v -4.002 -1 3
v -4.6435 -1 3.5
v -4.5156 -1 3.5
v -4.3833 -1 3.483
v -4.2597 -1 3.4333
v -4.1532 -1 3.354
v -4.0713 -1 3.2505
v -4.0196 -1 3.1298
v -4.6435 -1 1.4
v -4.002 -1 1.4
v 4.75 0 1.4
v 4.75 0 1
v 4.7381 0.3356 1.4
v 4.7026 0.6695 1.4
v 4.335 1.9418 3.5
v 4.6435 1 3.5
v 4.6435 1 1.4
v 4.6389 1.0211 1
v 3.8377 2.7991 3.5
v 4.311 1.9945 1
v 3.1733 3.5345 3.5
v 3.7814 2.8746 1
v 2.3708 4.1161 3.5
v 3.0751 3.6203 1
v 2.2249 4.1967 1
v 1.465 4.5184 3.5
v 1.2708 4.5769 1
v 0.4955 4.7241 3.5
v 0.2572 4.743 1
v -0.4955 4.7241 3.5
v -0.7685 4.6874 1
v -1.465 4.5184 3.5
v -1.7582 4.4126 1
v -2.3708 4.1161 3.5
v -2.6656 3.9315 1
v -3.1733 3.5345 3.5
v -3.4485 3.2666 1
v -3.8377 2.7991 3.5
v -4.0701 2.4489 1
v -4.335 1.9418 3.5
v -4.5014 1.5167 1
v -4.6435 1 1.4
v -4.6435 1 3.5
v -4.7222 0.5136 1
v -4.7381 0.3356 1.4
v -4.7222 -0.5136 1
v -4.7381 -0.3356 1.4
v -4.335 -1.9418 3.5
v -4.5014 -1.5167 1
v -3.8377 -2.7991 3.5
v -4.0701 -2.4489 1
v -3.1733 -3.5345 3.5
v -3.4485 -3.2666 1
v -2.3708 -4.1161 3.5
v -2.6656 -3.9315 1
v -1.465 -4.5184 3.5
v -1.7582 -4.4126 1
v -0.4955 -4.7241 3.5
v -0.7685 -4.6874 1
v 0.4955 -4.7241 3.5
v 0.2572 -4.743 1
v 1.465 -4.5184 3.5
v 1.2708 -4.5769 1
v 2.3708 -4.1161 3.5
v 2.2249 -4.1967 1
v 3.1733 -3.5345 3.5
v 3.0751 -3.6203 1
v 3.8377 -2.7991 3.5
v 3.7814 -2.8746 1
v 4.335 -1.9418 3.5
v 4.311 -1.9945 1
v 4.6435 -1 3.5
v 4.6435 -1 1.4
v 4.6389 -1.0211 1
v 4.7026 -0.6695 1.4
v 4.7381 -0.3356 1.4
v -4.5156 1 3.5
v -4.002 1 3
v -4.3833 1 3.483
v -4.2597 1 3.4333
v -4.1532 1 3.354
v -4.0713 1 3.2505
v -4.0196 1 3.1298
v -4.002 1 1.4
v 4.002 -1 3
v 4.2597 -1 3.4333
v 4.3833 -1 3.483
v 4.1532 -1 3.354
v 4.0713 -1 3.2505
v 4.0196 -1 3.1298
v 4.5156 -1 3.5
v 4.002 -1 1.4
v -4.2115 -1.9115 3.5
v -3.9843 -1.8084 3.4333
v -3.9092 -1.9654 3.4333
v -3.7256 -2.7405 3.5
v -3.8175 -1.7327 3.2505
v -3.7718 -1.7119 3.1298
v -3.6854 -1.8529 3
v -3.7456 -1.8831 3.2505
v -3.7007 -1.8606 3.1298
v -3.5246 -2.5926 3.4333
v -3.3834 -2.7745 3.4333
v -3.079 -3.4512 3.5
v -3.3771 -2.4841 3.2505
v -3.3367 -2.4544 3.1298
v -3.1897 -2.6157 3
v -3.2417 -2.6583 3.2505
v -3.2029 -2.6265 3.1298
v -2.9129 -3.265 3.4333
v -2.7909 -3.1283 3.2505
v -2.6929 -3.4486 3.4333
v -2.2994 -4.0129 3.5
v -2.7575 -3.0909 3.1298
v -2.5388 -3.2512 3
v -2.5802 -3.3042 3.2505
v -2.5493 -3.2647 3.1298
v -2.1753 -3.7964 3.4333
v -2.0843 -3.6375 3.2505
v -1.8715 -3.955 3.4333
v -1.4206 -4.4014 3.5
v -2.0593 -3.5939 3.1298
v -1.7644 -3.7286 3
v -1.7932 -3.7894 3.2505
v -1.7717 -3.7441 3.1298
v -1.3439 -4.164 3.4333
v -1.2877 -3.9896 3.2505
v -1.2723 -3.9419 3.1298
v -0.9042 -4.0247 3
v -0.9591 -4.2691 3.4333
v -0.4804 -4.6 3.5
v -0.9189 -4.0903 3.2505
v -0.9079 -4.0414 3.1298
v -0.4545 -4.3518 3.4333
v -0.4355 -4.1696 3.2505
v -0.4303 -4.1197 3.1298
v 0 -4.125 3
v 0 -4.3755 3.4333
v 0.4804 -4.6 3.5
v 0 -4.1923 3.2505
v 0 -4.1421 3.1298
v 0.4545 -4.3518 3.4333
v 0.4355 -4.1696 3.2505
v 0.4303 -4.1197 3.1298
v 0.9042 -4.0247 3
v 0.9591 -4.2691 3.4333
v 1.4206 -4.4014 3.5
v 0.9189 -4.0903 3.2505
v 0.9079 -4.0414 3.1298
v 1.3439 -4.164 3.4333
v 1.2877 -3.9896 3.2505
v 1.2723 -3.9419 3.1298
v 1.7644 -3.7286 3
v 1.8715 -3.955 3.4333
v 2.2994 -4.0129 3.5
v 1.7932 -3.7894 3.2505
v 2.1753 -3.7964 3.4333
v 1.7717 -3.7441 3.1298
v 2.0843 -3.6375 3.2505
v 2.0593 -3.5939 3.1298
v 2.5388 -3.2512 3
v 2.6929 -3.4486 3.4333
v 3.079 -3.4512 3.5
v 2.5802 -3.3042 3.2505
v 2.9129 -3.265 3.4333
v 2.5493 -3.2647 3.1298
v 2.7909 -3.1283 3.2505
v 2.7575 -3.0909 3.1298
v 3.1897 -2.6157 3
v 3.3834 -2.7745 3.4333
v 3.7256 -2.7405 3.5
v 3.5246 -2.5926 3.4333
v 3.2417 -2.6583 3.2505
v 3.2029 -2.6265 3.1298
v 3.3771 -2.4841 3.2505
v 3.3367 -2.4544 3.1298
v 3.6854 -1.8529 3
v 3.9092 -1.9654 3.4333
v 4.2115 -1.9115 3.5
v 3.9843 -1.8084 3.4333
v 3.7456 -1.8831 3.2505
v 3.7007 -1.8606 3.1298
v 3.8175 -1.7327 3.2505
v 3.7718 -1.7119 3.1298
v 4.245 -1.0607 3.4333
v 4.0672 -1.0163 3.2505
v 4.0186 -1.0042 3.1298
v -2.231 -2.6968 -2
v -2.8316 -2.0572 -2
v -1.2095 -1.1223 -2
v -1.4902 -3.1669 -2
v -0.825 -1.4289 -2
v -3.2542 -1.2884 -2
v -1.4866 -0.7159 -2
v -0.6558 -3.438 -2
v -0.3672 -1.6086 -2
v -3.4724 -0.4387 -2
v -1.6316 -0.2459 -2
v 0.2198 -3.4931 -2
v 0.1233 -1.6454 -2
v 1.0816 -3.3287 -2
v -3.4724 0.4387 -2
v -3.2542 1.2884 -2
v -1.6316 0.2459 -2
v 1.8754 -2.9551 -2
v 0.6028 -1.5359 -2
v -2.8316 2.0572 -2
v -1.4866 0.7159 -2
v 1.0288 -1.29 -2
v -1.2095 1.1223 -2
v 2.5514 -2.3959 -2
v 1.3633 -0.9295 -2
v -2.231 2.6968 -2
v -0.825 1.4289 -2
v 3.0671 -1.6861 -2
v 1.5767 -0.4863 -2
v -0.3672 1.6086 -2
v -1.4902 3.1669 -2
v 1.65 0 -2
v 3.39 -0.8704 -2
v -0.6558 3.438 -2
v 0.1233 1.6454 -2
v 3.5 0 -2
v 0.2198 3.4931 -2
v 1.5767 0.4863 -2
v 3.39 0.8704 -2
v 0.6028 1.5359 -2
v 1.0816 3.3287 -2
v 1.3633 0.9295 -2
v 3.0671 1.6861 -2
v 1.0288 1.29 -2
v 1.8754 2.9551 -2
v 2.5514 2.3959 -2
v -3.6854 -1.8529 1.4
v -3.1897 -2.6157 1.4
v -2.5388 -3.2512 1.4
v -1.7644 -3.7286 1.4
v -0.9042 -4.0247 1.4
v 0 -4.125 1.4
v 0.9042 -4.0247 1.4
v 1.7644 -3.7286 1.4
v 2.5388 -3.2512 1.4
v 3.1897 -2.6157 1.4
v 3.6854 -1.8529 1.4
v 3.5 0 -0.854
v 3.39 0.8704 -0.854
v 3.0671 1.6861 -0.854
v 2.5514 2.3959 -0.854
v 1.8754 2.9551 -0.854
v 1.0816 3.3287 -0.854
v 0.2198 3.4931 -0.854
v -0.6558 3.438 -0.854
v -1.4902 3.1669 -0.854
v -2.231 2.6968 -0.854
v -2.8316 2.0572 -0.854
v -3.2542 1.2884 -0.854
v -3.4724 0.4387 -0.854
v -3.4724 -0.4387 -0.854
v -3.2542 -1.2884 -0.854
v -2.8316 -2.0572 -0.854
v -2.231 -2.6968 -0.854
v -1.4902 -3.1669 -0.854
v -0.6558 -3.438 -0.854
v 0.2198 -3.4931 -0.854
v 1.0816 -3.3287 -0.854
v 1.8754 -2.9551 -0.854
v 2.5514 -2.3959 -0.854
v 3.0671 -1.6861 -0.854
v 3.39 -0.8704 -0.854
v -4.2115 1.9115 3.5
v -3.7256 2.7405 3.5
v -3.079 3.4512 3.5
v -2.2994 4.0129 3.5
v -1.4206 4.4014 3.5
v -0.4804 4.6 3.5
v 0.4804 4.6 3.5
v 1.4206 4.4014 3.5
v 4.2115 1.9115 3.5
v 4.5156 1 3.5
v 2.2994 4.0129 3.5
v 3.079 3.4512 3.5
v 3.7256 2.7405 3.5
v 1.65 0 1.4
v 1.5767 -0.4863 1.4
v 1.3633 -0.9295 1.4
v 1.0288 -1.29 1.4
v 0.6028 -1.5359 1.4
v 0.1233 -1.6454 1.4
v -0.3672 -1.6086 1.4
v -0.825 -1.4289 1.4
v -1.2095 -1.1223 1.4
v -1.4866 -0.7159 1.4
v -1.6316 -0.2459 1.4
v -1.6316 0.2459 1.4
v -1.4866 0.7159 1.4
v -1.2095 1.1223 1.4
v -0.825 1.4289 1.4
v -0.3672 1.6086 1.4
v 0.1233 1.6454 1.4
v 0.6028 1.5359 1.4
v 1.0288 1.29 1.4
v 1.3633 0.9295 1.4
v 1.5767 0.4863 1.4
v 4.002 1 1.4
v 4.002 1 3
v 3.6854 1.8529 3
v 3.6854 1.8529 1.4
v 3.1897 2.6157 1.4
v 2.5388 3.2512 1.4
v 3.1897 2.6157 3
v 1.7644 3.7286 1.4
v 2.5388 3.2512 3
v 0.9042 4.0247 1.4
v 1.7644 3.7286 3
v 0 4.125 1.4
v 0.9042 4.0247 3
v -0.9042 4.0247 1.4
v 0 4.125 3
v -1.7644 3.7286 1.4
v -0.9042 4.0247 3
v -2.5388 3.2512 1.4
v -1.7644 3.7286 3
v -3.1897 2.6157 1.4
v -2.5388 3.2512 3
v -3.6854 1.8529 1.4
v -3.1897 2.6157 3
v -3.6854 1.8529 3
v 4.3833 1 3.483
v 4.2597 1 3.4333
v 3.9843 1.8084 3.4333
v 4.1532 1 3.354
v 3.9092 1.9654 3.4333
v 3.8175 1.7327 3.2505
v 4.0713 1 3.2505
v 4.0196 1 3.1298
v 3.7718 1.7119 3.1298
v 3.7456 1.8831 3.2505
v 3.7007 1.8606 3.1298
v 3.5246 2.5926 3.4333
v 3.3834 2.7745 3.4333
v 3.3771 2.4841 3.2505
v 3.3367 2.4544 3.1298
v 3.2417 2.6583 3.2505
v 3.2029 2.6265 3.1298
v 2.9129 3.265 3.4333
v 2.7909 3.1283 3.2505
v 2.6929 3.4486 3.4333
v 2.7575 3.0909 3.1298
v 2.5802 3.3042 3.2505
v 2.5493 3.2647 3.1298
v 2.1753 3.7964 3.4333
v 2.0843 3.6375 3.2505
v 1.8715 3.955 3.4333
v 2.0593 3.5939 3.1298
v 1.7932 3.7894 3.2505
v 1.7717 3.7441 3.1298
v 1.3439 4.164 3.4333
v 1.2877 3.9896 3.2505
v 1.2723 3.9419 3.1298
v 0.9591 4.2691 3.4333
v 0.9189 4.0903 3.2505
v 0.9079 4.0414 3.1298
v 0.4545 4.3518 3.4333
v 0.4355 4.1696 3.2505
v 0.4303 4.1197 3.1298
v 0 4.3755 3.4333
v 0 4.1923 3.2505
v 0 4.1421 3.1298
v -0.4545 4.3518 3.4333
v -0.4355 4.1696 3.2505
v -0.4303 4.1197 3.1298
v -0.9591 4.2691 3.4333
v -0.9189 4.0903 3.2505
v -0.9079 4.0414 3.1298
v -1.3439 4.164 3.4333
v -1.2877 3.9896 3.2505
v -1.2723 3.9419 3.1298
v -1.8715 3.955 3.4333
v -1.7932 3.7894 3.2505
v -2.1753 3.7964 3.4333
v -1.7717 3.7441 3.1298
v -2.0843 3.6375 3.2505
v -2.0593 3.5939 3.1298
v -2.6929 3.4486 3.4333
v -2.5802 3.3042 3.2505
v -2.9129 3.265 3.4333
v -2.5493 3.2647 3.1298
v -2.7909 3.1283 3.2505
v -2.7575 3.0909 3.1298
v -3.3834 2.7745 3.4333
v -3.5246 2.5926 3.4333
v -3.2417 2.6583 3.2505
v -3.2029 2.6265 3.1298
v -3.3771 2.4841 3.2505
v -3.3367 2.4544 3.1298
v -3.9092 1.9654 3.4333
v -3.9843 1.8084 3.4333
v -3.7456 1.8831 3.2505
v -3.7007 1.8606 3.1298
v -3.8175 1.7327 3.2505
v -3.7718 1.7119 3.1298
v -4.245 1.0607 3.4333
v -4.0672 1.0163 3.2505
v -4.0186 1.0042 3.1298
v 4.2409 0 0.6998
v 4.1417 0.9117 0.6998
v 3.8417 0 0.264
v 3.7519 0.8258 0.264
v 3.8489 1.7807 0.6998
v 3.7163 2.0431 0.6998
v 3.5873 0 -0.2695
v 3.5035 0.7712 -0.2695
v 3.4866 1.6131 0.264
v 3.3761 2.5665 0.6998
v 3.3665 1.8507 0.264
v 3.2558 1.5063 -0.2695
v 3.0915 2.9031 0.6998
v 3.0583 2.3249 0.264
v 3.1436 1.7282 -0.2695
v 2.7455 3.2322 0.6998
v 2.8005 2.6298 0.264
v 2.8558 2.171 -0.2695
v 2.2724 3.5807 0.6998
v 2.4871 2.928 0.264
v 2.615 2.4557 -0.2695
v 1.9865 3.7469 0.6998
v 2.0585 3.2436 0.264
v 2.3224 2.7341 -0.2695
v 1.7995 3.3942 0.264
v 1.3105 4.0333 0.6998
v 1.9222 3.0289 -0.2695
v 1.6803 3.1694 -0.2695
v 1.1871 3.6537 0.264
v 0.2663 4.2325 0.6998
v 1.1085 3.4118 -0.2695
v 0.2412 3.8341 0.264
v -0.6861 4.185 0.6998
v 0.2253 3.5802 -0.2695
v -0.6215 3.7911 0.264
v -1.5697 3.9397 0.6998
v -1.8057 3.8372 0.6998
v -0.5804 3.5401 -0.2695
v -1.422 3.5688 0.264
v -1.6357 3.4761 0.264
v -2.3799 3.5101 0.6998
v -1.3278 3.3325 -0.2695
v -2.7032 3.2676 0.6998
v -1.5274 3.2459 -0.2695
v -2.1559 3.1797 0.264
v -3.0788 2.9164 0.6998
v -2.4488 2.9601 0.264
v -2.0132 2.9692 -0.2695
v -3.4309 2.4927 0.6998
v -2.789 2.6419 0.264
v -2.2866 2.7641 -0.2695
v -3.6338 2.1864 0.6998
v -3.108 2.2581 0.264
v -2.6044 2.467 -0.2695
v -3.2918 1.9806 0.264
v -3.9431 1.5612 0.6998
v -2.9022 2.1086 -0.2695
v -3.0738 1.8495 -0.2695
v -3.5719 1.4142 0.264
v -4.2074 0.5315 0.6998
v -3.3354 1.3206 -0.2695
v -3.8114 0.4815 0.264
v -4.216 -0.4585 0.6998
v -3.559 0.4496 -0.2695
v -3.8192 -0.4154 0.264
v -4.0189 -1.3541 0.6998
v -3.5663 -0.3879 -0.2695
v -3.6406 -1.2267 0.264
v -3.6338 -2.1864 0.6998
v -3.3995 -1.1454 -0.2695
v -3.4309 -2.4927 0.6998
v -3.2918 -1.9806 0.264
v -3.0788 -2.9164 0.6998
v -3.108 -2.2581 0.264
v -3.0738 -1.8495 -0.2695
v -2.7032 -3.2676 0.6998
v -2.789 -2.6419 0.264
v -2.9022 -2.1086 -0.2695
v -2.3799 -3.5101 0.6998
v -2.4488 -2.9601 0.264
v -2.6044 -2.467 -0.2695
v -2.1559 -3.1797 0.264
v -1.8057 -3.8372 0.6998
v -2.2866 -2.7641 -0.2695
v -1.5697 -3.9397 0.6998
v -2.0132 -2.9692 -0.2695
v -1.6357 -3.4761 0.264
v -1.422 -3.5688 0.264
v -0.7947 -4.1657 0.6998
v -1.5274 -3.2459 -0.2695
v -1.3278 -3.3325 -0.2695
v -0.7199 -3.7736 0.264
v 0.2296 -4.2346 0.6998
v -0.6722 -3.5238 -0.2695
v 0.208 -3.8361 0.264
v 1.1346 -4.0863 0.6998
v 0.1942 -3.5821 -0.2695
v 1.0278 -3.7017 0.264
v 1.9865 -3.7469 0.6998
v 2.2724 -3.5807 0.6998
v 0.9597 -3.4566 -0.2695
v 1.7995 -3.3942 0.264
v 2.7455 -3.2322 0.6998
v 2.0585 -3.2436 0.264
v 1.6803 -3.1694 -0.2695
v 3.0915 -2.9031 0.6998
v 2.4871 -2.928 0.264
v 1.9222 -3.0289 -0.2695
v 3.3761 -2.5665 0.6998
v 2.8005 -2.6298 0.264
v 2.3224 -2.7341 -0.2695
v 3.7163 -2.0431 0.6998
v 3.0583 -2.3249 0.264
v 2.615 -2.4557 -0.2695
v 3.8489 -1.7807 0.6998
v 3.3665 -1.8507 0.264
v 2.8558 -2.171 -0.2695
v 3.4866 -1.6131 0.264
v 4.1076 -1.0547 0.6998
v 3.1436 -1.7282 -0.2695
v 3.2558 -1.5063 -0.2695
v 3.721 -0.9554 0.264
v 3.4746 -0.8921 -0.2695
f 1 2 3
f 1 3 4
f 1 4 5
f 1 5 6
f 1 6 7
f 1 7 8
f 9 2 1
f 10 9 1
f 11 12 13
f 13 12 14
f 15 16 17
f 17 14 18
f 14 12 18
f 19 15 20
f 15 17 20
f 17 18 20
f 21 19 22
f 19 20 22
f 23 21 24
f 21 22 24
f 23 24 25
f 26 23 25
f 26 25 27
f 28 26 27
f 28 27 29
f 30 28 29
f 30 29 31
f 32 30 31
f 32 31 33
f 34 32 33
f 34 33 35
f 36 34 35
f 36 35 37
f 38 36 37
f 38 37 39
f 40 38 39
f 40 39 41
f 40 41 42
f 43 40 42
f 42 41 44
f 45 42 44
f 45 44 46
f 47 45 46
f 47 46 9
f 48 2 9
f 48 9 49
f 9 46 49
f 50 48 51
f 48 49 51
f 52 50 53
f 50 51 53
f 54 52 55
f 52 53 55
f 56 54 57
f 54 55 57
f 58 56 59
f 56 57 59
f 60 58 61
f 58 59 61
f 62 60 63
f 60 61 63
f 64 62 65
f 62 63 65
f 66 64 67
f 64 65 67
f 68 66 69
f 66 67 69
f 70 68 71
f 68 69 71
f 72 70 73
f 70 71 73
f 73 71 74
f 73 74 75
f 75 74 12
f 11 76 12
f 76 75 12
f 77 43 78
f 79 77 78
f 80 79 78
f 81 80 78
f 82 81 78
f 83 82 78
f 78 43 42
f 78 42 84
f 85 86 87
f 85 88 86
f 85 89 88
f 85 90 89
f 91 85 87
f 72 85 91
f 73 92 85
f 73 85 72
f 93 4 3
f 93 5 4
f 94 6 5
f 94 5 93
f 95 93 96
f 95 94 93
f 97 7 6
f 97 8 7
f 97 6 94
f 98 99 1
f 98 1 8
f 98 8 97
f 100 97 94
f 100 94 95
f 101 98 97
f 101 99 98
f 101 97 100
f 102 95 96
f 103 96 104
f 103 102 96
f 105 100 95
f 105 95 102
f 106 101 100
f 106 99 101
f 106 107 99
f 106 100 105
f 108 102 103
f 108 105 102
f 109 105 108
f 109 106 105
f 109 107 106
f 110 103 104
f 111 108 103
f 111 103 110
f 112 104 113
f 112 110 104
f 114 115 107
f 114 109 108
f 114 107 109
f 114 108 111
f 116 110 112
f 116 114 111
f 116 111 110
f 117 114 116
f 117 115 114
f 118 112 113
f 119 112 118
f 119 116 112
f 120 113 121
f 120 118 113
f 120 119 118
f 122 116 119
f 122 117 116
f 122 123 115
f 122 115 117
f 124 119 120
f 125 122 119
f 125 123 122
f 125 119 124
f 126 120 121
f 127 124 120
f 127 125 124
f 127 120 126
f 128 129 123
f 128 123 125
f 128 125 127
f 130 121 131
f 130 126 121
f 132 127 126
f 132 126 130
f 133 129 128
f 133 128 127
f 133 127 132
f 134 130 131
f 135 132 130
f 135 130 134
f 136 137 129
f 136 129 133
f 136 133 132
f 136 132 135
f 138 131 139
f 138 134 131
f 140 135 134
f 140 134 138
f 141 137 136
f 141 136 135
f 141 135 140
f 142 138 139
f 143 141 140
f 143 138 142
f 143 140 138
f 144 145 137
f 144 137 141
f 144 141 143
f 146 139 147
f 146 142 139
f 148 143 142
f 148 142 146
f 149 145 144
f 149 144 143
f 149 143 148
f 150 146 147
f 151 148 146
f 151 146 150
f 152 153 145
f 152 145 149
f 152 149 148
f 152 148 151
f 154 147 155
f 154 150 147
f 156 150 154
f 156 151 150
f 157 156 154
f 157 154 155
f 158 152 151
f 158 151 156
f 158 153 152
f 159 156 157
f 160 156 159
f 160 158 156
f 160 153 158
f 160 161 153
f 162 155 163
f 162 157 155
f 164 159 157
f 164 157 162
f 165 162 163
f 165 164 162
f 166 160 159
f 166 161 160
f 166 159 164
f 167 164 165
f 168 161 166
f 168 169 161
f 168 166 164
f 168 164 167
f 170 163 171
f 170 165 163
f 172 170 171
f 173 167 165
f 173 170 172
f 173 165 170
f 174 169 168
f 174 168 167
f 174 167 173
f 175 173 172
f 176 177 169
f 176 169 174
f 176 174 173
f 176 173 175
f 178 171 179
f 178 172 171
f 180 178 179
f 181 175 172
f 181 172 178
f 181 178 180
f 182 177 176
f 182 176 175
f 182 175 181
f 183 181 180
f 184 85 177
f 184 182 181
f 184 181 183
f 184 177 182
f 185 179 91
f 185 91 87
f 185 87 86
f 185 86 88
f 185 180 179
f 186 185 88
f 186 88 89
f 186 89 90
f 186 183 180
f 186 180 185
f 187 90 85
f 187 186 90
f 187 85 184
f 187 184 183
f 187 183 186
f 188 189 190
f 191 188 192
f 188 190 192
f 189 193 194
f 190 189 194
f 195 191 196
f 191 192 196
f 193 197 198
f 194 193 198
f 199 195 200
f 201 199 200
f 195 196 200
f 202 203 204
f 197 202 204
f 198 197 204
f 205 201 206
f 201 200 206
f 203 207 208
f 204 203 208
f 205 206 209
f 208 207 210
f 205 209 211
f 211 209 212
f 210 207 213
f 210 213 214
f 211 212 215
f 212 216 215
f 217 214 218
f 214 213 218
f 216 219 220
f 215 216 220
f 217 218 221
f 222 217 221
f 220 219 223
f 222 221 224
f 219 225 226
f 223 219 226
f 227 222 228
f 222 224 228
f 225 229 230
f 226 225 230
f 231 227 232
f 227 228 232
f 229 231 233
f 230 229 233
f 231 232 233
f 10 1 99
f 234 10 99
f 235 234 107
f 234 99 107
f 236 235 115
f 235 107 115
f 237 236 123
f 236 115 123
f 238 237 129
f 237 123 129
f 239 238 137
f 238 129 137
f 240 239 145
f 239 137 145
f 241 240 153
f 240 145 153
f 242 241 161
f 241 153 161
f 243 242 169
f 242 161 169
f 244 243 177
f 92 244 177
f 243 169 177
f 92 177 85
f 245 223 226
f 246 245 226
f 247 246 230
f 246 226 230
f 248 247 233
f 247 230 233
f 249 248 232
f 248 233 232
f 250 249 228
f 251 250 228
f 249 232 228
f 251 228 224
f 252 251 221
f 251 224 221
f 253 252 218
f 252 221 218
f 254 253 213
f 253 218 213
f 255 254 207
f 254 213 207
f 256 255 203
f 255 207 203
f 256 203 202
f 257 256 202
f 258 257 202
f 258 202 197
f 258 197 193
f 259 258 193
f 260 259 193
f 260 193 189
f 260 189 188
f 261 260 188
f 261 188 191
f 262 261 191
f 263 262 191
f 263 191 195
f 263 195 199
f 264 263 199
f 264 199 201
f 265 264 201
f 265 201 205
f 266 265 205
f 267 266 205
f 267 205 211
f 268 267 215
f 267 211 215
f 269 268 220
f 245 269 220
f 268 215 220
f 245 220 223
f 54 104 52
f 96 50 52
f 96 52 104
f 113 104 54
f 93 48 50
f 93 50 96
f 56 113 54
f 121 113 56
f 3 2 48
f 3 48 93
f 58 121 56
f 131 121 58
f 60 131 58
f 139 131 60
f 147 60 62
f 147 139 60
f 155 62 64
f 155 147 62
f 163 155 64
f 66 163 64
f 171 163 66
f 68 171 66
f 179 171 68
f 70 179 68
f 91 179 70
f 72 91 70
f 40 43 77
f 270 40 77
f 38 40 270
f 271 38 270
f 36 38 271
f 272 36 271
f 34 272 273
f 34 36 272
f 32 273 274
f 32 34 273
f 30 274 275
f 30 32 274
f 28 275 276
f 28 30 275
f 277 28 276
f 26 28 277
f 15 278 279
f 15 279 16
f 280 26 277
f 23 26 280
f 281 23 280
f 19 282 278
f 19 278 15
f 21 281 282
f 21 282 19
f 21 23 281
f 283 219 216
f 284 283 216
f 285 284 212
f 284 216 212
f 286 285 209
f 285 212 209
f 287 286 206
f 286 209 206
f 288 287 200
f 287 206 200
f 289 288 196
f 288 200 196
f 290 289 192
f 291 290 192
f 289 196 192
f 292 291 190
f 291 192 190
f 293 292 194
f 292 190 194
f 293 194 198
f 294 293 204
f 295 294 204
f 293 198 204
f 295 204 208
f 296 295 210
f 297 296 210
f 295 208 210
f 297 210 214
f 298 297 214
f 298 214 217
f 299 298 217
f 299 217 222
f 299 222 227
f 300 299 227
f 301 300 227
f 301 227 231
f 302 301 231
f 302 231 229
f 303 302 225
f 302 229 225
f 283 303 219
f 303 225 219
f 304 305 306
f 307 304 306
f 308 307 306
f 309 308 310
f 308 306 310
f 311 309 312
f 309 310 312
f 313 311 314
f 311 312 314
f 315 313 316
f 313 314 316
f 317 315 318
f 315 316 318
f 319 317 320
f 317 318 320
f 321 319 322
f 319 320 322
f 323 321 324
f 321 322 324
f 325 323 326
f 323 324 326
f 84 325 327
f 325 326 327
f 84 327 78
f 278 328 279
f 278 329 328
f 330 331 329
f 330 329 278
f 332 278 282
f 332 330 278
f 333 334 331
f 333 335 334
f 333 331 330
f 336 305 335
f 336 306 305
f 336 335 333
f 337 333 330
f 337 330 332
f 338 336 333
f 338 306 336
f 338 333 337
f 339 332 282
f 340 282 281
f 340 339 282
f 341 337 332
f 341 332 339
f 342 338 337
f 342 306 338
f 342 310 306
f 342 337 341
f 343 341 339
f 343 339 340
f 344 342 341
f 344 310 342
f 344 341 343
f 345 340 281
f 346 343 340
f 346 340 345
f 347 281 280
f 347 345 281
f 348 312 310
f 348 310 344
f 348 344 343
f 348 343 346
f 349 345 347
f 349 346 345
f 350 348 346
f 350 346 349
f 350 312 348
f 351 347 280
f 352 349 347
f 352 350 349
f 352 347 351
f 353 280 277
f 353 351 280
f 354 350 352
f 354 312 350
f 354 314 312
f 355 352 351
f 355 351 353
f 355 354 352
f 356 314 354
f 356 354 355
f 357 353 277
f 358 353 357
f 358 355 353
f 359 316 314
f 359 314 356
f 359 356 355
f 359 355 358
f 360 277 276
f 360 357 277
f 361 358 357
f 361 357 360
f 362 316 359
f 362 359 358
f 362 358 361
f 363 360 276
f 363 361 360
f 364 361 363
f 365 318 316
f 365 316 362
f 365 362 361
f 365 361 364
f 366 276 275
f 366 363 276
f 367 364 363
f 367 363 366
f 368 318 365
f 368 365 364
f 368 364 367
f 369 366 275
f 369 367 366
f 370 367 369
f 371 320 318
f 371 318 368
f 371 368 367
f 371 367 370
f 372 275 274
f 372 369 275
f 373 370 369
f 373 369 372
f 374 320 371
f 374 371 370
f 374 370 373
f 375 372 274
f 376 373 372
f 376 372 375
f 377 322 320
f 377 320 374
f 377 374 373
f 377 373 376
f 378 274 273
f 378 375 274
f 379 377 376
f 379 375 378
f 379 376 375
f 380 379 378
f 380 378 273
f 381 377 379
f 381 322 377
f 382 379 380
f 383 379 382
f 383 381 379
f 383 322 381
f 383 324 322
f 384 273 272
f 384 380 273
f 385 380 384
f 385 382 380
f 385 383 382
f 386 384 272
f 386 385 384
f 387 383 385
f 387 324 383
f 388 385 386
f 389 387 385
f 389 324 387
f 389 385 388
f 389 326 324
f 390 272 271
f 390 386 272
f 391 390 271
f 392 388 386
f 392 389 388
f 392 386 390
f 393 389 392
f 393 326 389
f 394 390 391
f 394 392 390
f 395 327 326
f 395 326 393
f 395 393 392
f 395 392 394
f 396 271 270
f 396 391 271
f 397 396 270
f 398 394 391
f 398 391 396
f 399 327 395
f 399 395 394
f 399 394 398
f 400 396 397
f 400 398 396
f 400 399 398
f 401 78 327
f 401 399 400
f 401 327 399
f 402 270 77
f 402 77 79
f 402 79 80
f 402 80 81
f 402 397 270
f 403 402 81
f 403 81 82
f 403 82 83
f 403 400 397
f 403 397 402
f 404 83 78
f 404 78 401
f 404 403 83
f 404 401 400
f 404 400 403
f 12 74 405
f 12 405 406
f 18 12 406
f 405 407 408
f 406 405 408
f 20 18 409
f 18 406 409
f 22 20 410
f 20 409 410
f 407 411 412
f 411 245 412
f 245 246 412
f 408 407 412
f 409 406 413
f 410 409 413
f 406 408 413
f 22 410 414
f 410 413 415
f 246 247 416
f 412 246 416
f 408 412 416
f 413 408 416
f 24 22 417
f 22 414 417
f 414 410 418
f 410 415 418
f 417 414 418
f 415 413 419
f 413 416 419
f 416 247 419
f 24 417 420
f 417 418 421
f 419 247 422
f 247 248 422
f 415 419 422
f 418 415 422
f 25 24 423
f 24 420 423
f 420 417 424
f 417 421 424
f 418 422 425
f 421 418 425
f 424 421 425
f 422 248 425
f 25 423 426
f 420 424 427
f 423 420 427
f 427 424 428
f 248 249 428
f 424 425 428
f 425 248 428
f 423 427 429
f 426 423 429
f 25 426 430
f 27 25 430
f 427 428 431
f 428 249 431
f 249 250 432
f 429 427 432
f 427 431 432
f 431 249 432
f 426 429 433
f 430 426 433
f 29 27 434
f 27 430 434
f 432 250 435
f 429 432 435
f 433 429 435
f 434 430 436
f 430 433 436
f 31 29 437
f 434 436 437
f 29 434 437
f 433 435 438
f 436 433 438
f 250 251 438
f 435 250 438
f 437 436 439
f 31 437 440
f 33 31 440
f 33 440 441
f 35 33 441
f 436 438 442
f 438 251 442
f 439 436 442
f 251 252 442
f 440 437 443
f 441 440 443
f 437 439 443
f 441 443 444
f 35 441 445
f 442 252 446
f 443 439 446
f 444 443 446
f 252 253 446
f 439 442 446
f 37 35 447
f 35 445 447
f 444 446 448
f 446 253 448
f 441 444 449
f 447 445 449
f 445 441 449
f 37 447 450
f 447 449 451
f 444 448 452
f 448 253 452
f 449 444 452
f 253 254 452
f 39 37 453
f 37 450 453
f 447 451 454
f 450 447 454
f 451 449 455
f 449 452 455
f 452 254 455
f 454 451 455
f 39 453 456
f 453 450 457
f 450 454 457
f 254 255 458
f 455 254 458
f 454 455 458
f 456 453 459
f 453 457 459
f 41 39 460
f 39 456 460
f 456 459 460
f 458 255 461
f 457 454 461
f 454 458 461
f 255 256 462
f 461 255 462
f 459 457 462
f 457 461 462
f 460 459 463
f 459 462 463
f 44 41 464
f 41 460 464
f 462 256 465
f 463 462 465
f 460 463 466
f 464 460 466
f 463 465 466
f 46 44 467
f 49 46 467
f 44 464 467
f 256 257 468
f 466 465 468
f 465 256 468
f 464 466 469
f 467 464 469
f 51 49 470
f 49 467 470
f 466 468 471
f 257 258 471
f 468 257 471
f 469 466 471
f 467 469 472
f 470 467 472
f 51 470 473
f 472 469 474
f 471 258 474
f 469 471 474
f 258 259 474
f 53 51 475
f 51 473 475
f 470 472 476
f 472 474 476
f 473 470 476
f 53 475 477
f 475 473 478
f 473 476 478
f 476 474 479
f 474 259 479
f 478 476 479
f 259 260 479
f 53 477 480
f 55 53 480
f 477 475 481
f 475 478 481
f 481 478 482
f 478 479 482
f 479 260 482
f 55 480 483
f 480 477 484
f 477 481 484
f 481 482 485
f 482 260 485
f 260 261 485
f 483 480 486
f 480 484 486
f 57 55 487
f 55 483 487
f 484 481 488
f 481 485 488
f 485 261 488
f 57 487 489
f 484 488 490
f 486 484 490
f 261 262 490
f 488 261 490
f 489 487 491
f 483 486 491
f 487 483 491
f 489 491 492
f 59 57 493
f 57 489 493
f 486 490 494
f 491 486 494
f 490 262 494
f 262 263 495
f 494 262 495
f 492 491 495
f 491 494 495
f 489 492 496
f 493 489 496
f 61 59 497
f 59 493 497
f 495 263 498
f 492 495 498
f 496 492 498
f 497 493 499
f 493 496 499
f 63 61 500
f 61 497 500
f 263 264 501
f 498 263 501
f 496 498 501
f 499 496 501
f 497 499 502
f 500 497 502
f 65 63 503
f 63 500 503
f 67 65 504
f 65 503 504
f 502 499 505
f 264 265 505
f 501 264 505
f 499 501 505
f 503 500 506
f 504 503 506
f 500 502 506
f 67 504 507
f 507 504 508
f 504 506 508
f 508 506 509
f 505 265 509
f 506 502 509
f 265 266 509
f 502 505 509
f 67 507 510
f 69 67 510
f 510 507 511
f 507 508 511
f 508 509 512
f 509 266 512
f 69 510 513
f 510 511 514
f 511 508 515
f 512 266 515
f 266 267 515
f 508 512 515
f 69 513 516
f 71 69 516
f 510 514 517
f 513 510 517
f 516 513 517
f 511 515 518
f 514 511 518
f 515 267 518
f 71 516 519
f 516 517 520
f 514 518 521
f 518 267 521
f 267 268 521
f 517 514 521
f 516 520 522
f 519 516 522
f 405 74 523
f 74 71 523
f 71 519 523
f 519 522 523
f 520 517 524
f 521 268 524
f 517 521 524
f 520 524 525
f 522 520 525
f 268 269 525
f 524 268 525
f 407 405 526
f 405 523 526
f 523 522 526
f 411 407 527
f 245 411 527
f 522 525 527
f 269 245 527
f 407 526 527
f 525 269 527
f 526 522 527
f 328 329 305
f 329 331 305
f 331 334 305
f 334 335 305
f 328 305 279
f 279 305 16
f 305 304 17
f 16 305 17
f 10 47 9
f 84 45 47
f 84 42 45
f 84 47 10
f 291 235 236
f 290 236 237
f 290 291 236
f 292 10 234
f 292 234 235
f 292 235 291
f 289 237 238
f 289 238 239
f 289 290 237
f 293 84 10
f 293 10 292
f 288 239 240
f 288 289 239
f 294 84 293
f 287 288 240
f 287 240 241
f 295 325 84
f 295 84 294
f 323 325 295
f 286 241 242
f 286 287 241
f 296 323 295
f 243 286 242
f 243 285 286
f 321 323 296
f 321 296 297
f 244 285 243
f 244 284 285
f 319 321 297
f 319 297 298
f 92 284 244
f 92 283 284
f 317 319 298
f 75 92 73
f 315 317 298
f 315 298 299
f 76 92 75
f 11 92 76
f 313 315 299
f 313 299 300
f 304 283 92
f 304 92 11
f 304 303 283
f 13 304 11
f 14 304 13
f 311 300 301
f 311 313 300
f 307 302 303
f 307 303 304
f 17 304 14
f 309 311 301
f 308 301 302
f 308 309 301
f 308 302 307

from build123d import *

# Parameters (mm, degrees)
BOSS_EXTRUDE1_DEPTH      = 1
BOSS_EXTRUDE1_DEPTH_BACK = 2
SKETCH1_R                = 3.5
SKETCH1_R_2              = 1.65
SKETCH2_R                = 4.75
BOSS_EXTRUDE2_DEPTH      = 2.5
SKETCH3_R                = 4.125
CUT_EXTRUDE1_DEPTH       = 2.1
FILLET1_R                = 0.5
SKETCH4_R                = 1.65
CUT_EXTRUDE2_DEPTH       = 10
SKETCH5_W                = 15.11331488
SKETCH5_H                = 2
CUT_EXTRUDE3_DEPTH       = 3
FILLET2_R                = 2


with BuildPart() as part:
    # Sketch1 → Boss-Extrude1 (new, two sides: drawn at the far end of the back side and taken through both)
    with BuildSketch(Plane.XY.offset(-BOSS_EXTRUDE1_DEPTH_BACK)):
        Circle(SKETCH1_R)
        Circle(SKETCH1_R_2, mode=Mode.SUBTRACT)
    extrude(amount=BOSS_EXTRUDE1_DEPTH + BOSS_EXTRUDE1_DEPTH_BACK)

    # Sketch2 → Boss-Extrude2 (add)
    with BuildSketch(Plane.XY.offset(1)):
        Circle(SKETCH2_R)
    extrude(amount=BOSS_EXTRUDE2_DEPTH)

    # Sketch3 → Cut-Extrude1 (cut)
    with BuildSketch(Plane.XY.offset(3.5)):
        Circle(SKETCH3_R)
    extrude(amount=-CUT_EXTRUDE1_DEPTH, mode=Mode.SUBTRACT)

    # Fillet1
    fillet1_edges = [part.edges().sort_by_distance(p)[0] for p in [
        (-4.125, 0, 3.5),
    ]]
    fillet(fillet1_edges, radius=FILLET1_R)

    # Sketch4 → Cut-Extrude2 (cut)
    with BuildSketch(Plane(origin=(0, 0, -2), x_dir=(-1, 0, 0), z_dir=(0, 0, -1))):
        with Locations(Location((0, 0, 0), (0, 0, 180))):
            Circle(SKETCH4_R)
    extrude(amount=-CUT_EXTRUDE2_DEPTH, mode=Mode.SUBTRACT)

    # Sketch5 → Cut-Extrude3 (cut)
    with BuildSketch(Plane.XY.offset(1.4)):
        Rectangle(SKETCH5_W, SKETCH5_H)
    extrude(amount=CUT_EXTRUDE3_DEPTH, mode=Mode.SUBTRACT)

    # Fillet2
    # the kernel refuses this fillet: 2 mm, written as the material it adds along each edge
    with BuildSketch(Plane(origin=(0, 0, 1), x_dir=(1, 0, 0), z_dir=(0, -1, 0))) as fillet2_piece_1:
        with BuildLine():
            CenterArc((5.5, -1.854049622), FILLET2_R, 112.024312837, 67.975687163)
            Line((4.75, 0), (4.735, 0.037080992))
            ThreePointArc((4.735, 0.037080992), (4.125, 0.04), (3.5, 0.04))
            Line((3.5, 0.04), (3.46, 0))
            Line((3.46, 0), (3.46, -1.854049622))
            Line((3.46, -1.854049622), (3.5, -1.854049622))
        make_face()
    revolve(axis=Axis((0, 0, 1), (0, 0, 1)))


solid = part.part
